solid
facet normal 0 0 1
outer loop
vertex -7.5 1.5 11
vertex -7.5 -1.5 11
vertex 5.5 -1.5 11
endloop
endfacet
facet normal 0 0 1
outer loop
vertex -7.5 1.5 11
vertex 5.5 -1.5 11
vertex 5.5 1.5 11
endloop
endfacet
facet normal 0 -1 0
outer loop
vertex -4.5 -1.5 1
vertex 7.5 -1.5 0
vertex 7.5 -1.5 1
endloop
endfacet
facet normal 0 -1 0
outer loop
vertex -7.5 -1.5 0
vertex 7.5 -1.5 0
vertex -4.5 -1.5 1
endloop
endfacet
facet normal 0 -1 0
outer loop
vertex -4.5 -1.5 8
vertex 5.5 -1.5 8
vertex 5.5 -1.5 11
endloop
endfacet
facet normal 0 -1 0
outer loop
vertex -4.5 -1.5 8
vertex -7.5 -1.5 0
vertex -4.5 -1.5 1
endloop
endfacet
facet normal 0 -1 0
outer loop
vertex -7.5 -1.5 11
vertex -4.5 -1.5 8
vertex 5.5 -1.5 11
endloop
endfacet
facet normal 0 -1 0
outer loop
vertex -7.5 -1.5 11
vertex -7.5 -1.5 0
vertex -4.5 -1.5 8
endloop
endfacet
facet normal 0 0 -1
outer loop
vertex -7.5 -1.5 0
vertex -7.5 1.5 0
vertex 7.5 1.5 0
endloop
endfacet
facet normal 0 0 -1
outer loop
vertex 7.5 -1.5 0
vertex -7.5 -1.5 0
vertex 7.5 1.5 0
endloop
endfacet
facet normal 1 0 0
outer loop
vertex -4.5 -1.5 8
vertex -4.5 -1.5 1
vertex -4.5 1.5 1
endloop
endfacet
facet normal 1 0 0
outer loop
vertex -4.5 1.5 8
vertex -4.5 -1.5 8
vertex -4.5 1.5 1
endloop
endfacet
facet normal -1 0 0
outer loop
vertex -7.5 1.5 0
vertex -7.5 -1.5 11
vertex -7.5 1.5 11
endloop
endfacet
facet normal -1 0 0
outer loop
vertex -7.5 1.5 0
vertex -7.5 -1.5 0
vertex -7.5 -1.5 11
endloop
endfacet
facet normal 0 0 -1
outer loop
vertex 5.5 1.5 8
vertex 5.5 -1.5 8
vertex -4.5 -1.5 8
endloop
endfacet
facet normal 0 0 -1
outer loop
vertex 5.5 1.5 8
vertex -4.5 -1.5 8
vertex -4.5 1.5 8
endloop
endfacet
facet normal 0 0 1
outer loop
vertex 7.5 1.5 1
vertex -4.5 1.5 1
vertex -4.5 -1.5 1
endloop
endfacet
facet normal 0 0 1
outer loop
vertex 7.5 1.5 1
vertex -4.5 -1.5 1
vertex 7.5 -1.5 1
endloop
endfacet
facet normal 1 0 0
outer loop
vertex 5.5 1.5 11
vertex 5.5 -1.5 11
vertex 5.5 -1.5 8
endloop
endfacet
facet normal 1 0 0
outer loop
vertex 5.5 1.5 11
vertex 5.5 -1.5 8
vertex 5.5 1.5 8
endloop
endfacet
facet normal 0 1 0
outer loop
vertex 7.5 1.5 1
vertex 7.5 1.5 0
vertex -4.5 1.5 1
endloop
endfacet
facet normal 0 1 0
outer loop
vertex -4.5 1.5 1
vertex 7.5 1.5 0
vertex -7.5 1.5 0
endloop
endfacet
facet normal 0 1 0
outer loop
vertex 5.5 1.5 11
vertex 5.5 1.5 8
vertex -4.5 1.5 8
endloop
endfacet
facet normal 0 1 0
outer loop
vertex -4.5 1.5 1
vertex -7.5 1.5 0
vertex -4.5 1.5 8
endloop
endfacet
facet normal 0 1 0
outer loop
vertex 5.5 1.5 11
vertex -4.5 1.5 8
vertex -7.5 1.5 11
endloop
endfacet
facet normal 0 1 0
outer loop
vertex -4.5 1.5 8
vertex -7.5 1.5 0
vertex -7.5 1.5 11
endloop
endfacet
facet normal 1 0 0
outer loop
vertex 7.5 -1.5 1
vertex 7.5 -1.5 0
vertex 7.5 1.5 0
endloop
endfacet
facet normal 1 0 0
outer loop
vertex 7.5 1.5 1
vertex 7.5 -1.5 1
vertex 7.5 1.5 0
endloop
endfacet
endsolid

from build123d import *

# Parameters (mm, degrees)
F0_W     = 15
F0_H     = 3
F1_DEPTH = 1
F2_W     = 3
F2_H     = 3
F3_DEPTH = 10
F4_W     = 3
F4_H     = 3
F5_DEPTH = 10


with BuildPart() as f1:
    # F0 (on Top) → F1 (new body)
    with BuildSketch(Plane.XY):
        Rectangle(F0_W, F0_H)
    extrude(amount=F1_DEPTH)

    # F2 (on face) → F3 (join)
    with BuildSketch(Plane.XY.offset(1)):
        with Locations((-6, 0)):
            Rectangle(F2_W, F2_H)
    extrude(amount=F3_DEPTH)

    # F4 (on face) → F5 (join)
    with BuildSketch(Plane.YZ.offset(-4.5)):
        with Locations((0, 9.5)):
            Rectangle(F4_W, F4_H)
    extrude(amount=F5_DEPTH)


solid = f1.part
